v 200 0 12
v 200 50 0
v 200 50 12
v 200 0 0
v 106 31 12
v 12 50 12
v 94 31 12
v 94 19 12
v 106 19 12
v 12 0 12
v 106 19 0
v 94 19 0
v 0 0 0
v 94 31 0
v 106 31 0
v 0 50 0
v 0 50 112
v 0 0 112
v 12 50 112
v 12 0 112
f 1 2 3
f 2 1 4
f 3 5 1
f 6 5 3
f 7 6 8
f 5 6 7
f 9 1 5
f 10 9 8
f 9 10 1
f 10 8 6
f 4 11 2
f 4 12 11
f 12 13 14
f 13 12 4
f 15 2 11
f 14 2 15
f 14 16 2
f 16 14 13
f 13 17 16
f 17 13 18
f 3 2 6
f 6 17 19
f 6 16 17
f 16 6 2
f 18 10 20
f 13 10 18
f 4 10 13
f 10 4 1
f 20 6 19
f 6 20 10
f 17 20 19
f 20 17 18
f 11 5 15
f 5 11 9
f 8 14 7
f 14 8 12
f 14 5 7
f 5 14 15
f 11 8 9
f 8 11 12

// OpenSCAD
$fn = 32;

// ----------------------------------------------------------------------
// Gantry bracket: 200-250 mm L bracket
// ----------------------------------------------------------------------

// --- parameters (mm) ---
base_l = 200;             // base arm length, X
arm_w = 50;               // arm width, Y
thick = 12;               // arm thickness
up_h = 100;               // vertical arm height, Z
slot_w = 12;              // adjustment slot width in the base

total_h = up_h + thick;  // overall height

difference() {
  union() {
    cube([base_l, arm_w, thick]);
    cube([thick, arm_w, total_h]);
  }
  translate([base_l / 2 - slot_w / 2, arm_w / 2 - slot_w / 2, -1])
    cube([slot_w, slot_w, thick + 2]);
}
